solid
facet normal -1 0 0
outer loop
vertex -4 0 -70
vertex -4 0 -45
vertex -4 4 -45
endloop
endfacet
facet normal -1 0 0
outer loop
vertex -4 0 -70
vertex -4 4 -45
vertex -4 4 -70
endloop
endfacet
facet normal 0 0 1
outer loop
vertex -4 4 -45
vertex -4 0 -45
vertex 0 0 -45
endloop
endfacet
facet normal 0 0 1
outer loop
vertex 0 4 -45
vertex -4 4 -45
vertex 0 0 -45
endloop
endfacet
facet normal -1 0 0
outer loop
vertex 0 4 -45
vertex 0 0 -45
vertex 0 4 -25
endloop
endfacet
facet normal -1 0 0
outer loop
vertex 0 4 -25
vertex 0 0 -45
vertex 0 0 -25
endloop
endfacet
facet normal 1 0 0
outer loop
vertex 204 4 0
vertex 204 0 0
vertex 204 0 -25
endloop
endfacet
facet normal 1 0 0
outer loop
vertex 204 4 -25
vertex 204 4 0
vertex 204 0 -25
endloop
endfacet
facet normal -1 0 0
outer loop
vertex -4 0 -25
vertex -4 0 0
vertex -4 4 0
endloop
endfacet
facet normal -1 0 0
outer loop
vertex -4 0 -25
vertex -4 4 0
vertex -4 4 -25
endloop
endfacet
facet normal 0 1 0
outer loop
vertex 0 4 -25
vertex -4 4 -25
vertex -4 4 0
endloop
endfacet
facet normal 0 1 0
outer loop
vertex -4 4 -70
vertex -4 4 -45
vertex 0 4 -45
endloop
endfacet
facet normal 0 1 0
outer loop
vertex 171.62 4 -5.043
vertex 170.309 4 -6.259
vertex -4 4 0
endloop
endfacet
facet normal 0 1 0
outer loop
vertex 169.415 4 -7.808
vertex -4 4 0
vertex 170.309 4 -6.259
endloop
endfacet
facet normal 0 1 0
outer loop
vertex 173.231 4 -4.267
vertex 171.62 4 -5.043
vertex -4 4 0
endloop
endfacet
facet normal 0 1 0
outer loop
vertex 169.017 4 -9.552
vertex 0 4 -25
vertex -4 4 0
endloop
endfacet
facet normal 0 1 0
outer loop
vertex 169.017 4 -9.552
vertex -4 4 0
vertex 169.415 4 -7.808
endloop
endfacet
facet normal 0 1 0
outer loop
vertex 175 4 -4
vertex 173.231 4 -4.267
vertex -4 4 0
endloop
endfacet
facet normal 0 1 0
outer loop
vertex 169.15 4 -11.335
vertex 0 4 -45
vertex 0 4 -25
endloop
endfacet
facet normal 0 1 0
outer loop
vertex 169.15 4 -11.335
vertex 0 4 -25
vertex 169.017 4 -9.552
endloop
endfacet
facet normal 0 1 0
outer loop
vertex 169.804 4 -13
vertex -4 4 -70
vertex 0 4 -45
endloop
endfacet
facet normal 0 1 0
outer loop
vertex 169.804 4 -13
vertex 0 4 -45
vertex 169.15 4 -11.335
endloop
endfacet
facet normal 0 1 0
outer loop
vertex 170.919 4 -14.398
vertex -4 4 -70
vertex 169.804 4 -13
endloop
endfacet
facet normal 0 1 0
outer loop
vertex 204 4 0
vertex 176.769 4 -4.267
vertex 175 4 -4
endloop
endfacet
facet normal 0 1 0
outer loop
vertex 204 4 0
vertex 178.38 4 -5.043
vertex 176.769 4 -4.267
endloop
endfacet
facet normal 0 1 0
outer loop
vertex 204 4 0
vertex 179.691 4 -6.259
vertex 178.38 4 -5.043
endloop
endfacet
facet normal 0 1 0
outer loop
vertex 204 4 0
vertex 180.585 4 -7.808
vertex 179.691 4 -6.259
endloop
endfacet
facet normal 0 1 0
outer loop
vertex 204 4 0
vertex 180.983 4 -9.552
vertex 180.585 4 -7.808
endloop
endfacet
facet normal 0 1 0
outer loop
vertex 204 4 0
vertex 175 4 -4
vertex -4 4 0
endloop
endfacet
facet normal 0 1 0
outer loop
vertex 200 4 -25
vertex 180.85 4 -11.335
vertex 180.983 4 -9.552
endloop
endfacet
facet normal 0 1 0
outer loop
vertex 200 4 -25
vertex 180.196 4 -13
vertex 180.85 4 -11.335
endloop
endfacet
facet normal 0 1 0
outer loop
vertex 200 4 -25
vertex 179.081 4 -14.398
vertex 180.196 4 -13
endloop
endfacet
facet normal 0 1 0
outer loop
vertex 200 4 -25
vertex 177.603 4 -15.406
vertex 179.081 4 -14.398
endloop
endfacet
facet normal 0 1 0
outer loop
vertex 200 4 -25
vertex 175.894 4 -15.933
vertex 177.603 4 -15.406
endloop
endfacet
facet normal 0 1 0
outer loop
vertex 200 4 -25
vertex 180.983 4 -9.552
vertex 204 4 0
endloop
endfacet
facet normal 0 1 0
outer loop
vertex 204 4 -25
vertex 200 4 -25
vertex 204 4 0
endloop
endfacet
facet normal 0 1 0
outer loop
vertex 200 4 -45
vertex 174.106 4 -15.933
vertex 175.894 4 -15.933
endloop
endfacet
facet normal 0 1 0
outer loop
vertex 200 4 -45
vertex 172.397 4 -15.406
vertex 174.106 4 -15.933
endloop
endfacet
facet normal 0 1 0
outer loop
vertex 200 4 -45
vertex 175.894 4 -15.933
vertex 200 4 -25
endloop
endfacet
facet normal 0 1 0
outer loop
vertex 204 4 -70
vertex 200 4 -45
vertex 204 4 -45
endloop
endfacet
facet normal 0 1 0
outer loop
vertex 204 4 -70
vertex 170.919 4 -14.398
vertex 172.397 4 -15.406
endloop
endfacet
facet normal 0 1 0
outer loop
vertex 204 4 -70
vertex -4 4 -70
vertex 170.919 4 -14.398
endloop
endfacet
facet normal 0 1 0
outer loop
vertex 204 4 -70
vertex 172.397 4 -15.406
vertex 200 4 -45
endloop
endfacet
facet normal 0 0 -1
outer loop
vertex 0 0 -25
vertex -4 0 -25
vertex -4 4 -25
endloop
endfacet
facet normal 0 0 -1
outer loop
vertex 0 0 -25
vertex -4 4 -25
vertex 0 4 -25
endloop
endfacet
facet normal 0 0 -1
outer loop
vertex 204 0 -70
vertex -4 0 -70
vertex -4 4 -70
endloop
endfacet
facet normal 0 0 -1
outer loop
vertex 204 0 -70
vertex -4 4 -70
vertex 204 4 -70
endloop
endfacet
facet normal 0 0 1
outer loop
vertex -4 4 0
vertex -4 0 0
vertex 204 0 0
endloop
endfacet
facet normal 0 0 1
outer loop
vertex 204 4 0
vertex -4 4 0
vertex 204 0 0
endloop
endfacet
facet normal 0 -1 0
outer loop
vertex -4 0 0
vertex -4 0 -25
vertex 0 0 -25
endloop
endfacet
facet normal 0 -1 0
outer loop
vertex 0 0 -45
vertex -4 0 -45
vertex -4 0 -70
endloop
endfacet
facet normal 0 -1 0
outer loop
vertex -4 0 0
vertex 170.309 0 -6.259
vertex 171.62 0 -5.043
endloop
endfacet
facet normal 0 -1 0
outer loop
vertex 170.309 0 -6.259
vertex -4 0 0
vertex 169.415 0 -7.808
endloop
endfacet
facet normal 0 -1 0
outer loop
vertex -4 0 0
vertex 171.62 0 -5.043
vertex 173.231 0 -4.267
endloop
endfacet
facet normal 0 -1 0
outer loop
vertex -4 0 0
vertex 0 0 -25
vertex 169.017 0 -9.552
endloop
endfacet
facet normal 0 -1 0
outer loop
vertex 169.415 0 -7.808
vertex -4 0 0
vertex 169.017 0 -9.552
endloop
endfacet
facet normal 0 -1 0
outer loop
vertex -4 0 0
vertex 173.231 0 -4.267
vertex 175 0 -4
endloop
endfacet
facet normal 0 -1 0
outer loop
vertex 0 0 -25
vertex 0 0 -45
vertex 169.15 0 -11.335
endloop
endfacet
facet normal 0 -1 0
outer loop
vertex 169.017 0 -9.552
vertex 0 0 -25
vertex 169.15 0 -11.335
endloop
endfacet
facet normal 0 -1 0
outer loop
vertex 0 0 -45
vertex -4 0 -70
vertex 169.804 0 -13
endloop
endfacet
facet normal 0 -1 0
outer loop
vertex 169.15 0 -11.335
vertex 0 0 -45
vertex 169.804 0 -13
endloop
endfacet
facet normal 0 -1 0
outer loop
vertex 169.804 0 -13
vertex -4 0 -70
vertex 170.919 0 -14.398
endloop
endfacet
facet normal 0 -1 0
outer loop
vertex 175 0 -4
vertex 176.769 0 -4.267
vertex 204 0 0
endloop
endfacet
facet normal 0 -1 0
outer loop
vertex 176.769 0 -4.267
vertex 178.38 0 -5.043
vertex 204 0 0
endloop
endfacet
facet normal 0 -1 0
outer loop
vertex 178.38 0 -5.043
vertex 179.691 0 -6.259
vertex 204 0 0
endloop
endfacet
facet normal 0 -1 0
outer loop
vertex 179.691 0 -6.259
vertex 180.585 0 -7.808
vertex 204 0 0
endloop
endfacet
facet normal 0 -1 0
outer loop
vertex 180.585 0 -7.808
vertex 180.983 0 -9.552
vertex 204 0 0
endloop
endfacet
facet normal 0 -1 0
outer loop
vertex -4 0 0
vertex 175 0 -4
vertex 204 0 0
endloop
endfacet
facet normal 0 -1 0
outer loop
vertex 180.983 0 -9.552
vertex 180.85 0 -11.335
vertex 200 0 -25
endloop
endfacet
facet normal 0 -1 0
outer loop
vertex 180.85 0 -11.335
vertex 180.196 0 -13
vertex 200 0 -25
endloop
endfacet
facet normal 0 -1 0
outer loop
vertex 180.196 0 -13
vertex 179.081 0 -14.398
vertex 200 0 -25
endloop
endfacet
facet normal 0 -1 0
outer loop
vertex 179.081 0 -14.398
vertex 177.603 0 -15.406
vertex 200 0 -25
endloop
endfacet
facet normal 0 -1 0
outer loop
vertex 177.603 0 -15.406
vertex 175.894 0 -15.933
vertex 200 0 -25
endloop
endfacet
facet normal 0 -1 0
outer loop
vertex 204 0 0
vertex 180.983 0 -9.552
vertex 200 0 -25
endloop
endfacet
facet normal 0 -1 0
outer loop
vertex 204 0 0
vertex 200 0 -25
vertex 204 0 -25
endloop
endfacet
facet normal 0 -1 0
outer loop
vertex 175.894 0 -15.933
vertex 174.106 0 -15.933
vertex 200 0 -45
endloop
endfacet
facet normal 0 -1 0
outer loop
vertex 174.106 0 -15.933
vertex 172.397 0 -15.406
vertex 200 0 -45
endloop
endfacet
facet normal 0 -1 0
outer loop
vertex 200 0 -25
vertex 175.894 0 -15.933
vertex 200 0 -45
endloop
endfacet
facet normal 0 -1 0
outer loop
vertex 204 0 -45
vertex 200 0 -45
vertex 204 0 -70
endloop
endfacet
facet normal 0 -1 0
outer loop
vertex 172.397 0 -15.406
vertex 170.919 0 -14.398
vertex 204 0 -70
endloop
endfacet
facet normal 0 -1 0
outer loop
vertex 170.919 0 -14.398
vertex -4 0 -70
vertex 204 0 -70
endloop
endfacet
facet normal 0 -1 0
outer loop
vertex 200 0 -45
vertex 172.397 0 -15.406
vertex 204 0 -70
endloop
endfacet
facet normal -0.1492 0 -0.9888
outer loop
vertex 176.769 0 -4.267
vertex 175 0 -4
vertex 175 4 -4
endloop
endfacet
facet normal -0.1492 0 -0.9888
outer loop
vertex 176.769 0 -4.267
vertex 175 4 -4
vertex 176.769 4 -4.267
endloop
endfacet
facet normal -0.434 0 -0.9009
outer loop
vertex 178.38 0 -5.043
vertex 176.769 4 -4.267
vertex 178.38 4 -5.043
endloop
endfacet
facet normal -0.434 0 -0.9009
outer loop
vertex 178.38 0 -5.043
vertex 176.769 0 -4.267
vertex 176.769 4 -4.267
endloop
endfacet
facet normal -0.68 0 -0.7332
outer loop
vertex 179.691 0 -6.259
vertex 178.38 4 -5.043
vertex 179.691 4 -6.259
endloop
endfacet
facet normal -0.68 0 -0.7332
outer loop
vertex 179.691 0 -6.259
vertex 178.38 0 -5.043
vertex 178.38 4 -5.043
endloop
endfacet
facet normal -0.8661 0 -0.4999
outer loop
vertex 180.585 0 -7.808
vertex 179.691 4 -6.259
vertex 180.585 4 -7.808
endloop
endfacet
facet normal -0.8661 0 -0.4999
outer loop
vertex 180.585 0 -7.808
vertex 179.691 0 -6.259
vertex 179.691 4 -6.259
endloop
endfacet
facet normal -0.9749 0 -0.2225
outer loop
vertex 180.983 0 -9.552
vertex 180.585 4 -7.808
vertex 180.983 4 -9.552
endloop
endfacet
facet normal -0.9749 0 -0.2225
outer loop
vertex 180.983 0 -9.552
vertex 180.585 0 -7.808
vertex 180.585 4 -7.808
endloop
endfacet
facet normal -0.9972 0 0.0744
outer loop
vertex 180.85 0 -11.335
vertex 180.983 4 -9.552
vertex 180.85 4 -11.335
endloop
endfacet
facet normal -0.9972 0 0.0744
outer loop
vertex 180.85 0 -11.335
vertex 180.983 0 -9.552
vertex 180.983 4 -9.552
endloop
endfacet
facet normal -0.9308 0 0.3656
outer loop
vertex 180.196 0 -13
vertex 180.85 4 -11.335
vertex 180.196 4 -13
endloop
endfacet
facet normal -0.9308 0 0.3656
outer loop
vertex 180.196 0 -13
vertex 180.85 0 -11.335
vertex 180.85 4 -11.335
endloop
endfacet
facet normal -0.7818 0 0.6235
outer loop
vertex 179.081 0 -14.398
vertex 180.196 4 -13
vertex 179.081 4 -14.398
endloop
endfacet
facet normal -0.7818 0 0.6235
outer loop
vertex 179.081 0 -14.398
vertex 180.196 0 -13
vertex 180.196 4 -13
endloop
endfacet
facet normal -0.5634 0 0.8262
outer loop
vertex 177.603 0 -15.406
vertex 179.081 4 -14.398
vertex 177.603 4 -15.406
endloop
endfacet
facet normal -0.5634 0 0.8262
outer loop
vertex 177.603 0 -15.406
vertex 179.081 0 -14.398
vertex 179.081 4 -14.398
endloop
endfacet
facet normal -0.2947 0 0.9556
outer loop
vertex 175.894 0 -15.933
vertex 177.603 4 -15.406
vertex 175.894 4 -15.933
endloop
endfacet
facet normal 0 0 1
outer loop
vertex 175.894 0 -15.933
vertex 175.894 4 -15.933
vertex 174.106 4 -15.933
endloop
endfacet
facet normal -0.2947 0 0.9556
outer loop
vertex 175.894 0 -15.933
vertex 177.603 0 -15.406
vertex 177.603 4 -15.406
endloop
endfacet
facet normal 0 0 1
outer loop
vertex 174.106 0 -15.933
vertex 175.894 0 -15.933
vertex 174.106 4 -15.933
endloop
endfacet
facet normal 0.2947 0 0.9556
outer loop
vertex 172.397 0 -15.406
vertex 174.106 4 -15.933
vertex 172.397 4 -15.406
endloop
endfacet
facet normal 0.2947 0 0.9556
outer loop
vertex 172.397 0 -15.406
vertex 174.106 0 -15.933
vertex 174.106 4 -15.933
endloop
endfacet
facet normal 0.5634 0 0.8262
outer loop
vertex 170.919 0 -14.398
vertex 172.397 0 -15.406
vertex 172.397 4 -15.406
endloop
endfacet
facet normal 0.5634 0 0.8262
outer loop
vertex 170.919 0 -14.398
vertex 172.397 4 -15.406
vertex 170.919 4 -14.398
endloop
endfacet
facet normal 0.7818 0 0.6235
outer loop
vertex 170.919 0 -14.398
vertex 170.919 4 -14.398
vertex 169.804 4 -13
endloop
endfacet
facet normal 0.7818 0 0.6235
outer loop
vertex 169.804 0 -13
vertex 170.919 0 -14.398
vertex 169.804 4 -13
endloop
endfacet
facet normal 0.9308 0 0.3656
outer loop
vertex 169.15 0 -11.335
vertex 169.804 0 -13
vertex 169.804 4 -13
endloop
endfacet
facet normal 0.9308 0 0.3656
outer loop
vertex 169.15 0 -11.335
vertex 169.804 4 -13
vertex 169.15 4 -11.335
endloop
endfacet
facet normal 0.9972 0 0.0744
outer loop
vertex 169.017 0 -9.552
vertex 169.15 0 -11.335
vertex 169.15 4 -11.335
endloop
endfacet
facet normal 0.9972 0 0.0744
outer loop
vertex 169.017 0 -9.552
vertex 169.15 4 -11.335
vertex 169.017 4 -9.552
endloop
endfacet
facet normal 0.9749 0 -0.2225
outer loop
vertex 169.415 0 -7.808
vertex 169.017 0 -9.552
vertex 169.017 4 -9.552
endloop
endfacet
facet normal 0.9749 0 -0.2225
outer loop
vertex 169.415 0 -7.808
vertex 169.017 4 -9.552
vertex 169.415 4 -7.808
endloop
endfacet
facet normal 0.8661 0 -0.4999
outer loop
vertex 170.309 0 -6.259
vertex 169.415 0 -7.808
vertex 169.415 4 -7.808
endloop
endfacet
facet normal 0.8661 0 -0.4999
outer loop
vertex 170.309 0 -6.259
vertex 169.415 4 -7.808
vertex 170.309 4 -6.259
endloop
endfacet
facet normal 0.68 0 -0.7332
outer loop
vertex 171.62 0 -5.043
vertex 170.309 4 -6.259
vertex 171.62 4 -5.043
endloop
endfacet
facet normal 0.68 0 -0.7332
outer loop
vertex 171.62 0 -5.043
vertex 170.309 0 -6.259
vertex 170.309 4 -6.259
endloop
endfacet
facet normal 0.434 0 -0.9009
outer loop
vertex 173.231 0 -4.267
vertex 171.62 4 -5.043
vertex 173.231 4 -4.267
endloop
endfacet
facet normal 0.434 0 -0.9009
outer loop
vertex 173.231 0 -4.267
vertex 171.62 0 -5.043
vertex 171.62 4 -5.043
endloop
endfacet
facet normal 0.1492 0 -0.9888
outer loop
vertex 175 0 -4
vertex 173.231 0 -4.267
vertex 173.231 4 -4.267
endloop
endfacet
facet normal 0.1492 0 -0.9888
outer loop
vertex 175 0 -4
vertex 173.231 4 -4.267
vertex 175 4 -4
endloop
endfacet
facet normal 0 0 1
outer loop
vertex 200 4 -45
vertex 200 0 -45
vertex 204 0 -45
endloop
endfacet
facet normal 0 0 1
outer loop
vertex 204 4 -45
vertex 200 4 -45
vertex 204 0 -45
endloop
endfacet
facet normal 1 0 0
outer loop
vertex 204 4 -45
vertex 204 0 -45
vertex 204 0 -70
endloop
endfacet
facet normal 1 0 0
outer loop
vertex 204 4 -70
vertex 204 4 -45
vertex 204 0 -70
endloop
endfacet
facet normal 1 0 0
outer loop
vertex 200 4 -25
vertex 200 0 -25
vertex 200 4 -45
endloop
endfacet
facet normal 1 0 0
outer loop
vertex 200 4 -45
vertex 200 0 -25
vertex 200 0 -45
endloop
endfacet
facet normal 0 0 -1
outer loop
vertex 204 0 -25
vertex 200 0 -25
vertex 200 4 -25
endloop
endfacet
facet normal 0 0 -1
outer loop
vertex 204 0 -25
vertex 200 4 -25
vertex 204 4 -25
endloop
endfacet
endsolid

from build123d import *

# Parameters (mm, degrees)
SKETCH1_R           = 6
SKETCH1_W           = 4
SKETCH1_H           = 25
BOSS_EXTRUDE1_DEPTH = 4


with BuildPart() as part:
    # Sketch1 → Boss-Extrude1 (new body)
    # profile 1 of 5: a face of its own
    with BuildSketch(Plane(origin=(0, 0, 0), x_dir=(1, 0, 0), z_dir=(0, 1, 0))):
        Polygon((0, 25), (0, 0), (200, 0), (200, 25), (200, 45), (200, 70), (0, 70), (0, 45), align=None)
        with Locations(Location((175, 10, 0), (0, 0, 270))):
            Circle(SKETCH1_R, mode=Mode.SUBTRACT)
    # profile 2 of 5: a face of its own
    with BuildSketch(Plane(origin=(0, 0, 0), x_dir=(1, 0, 0), z_dir=(0, 1, 0))):
        with Locations((-2, 12.5)):
            Rectangle(SKETCH1_W, SKETCH1_H)
    # profile 3 of 5: a face of its own
    with BuildSketch(Plane(origin=(0, 0, 0), x_dir=(1, 0, 0), z_dir=(0, 1, 0))):
        with Locations((202, 12.5)):
            Rectangle(SKETCH1_W, SKETCH1_H)
    # profile 4 of 5: a face of its own
    with BuildSketch(Plane(origin=(0, 0, 0), x_dir=(1, 0, 0), z_dir=(0, 1, 0))):
        with Locations((-2, 57.5)):
            Rectangle(SKETCH1_W, SKETCH1_H)
    # profile 5 of 5: a face of its own
    with BuildSketch(Plane(origin=(0, 0, 0), x_dir=(1, 0, 0), z_dir=(0, 1, 0))):
        with Locations((202, 57.5)):
            Rectangle(SKETCH1_W, SKETCH1_H)
    extrude(amount=BOSS_EXTRUDE1_DEPTH)


solid = part.part
